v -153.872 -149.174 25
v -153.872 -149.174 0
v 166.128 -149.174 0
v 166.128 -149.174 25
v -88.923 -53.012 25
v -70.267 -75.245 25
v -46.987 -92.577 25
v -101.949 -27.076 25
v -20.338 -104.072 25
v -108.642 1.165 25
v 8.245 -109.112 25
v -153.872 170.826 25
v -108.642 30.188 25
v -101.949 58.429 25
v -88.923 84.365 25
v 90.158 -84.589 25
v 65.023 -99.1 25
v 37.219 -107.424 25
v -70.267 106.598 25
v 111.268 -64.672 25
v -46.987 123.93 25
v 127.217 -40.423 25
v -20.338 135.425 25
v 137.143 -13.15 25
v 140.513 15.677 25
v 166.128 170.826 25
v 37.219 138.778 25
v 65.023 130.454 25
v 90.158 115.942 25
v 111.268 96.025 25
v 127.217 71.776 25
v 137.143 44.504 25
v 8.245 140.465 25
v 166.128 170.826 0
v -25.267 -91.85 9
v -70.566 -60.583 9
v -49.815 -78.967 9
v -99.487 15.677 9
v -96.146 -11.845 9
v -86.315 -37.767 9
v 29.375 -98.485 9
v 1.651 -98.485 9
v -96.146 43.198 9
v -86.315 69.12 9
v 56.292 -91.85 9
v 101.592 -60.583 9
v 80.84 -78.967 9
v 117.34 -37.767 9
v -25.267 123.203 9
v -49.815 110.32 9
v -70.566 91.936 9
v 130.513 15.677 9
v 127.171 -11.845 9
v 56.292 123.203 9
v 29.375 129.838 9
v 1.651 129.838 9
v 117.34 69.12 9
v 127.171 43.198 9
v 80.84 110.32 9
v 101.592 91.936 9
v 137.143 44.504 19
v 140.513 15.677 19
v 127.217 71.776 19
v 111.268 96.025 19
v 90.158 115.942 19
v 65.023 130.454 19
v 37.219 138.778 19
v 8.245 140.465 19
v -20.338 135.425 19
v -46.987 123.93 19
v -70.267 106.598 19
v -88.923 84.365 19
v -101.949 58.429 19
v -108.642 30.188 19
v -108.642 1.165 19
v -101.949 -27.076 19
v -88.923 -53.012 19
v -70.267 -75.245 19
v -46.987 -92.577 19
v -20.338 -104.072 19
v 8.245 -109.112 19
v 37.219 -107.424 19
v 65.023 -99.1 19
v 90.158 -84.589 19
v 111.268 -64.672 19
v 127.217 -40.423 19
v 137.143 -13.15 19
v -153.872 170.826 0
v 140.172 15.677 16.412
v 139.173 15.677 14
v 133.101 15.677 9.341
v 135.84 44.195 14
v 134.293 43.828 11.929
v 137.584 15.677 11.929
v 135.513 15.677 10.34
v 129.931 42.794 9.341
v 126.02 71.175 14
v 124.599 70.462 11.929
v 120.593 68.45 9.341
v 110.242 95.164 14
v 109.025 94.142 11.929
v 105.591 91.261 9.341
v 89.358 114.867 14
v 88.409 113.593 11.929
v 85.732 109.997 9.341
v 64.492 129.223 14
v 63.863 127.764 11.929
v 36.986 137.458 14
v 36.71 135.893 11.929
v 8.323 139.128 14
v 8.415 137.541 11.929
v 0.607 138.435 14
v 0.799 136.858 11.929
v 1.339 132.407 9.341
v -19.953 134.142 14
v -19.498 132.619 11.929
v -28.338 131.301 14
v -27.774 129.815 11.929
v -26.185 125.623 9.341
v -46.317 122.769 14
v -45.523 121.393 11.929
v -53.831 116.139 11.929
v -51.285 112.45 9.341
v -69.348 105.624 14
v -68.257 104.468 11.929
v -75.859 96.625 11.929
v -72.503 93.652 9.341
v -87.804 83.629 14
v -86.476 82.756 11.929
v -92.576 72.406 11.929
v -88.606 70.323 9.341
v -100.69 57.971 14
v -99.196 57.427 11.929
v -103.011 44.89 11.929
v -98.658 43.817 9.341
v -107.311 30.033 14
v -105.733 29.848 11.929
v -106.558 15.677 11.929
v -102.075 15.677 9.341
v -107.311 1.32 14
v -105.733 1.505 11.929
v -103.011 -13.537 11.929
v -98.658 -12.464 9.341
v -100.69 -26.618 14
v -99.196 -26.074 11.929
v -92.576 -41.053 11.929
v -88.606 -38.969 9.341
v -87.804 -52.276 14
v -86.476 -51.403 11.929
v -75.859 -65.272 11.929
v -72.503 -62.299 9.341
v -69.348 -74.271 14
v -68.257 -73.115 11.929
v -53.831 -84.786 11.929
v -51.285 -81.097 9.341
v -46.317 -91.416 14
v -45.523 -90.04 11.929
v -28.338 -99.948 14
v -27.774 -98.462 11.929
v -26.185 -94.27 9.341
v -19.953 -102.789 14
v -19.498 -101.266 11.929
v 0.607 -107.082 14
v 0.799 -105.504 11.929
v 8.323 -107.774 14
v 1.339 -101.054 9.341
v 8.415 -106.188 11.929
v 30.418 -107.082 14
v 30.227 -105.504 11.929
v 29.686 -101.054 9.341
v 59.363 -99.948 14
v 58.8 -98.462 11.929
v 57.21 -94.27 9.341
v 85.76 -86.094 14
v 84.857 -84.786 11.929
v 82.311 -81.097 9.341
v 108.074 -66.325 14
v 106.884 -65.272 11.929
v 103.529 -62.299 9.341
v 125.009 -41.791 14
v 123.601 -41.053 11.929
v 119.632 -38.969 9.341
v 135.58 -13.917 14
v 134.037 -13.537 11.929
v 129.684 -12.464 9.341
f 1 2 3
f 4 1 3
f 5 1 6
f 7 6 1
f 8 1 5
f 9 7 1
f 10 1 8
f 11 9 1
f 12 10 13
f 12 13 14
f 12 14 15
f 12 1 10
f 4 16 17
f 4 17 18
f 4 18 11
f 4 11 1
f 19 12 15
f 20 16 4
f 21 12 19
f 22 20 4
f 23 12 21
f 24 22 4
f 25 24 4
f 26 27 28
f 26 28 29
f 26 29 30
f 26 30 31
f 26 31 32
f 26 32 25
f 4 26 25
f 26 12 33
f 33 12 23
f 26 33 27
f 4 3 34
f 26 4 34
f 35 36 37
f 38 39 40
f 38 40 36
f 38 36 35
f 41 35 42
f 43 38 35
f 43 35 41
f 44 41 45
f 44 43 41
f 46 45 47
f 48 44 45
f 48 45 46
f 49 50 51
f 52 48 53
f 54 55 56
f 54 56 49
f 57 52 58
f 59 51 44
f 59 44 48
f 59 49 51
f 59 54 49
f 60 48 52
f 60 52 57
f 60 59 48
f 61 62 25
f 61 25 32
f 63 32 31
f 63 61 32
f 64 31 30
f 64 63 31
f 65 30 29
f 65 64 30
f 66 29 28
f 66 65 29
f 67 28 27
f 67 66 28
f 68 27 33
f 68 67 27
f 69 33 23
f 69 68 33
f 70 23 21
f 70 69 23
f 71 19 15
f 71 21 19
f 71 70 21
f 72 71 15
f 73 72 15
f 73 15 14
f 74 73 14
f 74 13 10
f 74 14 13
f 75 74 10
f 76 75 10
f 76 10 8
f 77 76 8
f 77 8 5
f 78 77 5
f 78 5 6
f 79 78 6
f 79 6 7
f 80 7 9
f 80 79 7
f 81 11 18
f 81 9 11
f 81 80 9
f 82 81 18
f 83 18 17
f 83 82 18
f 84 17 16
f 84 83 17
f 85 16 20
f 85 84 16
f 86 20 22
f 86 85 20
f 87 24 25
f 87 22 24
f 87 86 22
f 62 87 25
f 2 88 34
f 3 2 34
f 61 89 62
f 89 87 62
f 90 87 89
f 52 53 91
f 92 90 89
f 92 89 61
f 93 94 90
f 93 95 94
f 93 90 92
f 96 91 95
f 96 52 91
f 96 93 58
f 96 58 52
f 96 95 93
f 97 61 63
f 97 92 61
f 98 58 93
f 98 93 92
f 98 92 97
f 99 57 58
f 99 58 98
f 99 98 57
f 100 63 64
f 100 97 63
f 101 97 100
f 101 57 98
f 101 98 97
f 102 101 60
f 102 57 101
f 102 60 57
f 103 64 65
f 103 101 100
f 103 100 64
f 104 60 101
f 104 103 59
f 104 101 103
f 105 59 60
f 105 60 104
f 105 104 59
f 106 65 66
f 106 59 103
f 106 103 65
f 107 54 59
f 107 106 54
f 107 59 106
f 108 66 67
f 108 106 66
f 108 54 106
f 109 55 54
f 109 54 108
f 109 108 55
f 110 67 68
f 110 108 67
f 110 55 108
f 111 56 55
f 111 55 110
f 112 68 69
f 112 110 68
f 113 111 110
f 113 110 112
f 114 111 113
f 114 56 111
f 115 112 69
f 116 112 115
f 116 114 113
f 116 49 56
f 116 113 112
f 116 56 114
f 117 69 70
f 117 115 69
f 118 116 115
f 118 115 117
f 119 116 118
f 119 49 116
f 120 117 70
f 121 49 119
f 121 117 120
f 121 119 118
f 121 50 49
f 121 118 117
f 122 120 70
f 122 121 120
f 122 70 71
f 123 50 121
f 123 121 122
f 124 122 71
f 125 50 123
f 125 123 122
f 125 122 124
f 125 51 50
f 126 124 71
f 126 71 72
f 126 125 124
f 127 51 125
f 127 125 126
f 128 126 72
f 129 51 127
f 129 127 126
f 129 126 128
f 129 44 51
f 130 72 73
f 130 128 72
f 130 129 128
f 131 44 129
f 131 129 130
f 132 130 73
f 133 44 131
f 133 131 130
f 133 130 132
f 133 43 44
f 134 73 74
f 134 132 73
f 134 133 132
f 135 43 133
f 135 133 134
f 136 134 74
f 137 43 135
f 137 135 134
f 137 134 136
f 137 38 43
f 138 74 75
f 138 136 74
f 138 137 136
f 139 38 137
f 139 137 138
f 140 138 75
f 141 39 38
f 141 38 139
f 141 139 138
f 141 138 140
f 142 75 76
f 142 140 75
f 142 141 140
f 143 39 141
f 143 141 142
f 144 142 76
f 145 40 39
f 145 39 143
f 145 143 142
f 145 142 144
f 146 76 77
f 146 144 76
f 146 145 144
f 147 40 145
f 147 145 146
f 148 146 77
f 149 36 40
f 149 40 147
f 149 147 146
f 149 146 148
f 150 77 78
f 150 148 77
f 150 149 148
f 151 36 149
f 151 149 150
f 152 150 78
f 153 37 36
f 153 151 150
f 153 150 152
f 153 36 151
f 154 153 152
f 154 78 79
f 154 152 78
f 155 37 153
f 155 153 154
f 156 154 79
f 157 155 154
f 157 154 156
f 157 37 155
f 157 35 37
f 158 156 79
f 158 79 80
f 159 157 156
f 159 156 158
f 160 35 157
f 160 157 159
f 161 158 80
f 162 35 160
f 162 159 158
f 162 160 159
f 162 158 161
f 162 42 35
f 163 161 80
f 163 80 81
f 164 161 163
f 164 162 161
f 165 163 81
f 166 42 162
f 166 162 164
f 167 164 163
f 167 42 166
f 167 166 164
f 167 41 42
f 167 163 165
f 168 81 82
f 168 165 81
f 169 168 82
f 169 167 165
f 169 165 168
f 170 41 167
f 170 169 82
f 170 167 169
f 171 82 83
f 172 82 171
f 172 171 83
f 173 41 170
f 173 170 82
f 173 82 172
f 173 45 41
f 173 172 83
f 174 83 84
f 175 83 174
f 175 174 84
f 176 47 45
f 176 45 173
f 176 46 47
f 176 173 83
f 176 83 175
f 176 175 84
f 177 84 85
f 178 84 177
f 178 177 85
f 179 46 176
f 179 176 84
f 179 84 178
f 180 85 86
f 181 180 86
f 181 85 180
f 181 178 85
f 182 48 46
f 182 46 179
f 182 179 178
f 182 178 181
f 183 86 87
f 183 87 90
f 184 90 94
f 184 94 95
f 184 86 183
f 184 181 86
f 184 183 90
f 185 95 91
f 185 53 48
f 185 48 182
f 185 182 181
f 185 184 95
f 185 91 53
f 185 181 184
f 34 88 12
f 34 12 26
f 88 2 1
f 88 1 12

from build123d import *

# Parameters (mm, degrees)
F0_W     = 320
F0_H     = 320
F1_DEPTH = 25
F2_R     = 125
F3_DEPTH = 20
F4_R     = 10


with BuildPart() as f1:
    # F0 (on Top) → F1 (new body)
    with BuildSketch(Plane.XY):
        with Locations((6.127898, 10.826058)):
            Rectangle(F0_W, F0_H)
    extrude(amount=F1_DEPTH)


with BuildPart() as f3:
    # F2 (on face) → F3 (new body)
    with BuildSketch(Plane.XY.offset(25)):
        with Locations((357.512802, 15.676551)):
            Circle(F2_R)
    extrude(amount=F3_DEPTH)

    # F4
    f4_edges = [f3.edges().sort_by_distance(p)[0] for p in [
        (232.512802, 15.676551, 25),
    ]]
    fillet(f4_edges, radius=F4_R)


with BuildPart() as f3_1:
    # F5: moved
    add(f3.part.moved(Location((-342, 0, -16))))


with BuildPart() as f1_1:
    add(f1.part)

    # F6: cut F3
    add(f3_1.part, mode=Mode.SUBTRACT)


solid = f1_1.part
